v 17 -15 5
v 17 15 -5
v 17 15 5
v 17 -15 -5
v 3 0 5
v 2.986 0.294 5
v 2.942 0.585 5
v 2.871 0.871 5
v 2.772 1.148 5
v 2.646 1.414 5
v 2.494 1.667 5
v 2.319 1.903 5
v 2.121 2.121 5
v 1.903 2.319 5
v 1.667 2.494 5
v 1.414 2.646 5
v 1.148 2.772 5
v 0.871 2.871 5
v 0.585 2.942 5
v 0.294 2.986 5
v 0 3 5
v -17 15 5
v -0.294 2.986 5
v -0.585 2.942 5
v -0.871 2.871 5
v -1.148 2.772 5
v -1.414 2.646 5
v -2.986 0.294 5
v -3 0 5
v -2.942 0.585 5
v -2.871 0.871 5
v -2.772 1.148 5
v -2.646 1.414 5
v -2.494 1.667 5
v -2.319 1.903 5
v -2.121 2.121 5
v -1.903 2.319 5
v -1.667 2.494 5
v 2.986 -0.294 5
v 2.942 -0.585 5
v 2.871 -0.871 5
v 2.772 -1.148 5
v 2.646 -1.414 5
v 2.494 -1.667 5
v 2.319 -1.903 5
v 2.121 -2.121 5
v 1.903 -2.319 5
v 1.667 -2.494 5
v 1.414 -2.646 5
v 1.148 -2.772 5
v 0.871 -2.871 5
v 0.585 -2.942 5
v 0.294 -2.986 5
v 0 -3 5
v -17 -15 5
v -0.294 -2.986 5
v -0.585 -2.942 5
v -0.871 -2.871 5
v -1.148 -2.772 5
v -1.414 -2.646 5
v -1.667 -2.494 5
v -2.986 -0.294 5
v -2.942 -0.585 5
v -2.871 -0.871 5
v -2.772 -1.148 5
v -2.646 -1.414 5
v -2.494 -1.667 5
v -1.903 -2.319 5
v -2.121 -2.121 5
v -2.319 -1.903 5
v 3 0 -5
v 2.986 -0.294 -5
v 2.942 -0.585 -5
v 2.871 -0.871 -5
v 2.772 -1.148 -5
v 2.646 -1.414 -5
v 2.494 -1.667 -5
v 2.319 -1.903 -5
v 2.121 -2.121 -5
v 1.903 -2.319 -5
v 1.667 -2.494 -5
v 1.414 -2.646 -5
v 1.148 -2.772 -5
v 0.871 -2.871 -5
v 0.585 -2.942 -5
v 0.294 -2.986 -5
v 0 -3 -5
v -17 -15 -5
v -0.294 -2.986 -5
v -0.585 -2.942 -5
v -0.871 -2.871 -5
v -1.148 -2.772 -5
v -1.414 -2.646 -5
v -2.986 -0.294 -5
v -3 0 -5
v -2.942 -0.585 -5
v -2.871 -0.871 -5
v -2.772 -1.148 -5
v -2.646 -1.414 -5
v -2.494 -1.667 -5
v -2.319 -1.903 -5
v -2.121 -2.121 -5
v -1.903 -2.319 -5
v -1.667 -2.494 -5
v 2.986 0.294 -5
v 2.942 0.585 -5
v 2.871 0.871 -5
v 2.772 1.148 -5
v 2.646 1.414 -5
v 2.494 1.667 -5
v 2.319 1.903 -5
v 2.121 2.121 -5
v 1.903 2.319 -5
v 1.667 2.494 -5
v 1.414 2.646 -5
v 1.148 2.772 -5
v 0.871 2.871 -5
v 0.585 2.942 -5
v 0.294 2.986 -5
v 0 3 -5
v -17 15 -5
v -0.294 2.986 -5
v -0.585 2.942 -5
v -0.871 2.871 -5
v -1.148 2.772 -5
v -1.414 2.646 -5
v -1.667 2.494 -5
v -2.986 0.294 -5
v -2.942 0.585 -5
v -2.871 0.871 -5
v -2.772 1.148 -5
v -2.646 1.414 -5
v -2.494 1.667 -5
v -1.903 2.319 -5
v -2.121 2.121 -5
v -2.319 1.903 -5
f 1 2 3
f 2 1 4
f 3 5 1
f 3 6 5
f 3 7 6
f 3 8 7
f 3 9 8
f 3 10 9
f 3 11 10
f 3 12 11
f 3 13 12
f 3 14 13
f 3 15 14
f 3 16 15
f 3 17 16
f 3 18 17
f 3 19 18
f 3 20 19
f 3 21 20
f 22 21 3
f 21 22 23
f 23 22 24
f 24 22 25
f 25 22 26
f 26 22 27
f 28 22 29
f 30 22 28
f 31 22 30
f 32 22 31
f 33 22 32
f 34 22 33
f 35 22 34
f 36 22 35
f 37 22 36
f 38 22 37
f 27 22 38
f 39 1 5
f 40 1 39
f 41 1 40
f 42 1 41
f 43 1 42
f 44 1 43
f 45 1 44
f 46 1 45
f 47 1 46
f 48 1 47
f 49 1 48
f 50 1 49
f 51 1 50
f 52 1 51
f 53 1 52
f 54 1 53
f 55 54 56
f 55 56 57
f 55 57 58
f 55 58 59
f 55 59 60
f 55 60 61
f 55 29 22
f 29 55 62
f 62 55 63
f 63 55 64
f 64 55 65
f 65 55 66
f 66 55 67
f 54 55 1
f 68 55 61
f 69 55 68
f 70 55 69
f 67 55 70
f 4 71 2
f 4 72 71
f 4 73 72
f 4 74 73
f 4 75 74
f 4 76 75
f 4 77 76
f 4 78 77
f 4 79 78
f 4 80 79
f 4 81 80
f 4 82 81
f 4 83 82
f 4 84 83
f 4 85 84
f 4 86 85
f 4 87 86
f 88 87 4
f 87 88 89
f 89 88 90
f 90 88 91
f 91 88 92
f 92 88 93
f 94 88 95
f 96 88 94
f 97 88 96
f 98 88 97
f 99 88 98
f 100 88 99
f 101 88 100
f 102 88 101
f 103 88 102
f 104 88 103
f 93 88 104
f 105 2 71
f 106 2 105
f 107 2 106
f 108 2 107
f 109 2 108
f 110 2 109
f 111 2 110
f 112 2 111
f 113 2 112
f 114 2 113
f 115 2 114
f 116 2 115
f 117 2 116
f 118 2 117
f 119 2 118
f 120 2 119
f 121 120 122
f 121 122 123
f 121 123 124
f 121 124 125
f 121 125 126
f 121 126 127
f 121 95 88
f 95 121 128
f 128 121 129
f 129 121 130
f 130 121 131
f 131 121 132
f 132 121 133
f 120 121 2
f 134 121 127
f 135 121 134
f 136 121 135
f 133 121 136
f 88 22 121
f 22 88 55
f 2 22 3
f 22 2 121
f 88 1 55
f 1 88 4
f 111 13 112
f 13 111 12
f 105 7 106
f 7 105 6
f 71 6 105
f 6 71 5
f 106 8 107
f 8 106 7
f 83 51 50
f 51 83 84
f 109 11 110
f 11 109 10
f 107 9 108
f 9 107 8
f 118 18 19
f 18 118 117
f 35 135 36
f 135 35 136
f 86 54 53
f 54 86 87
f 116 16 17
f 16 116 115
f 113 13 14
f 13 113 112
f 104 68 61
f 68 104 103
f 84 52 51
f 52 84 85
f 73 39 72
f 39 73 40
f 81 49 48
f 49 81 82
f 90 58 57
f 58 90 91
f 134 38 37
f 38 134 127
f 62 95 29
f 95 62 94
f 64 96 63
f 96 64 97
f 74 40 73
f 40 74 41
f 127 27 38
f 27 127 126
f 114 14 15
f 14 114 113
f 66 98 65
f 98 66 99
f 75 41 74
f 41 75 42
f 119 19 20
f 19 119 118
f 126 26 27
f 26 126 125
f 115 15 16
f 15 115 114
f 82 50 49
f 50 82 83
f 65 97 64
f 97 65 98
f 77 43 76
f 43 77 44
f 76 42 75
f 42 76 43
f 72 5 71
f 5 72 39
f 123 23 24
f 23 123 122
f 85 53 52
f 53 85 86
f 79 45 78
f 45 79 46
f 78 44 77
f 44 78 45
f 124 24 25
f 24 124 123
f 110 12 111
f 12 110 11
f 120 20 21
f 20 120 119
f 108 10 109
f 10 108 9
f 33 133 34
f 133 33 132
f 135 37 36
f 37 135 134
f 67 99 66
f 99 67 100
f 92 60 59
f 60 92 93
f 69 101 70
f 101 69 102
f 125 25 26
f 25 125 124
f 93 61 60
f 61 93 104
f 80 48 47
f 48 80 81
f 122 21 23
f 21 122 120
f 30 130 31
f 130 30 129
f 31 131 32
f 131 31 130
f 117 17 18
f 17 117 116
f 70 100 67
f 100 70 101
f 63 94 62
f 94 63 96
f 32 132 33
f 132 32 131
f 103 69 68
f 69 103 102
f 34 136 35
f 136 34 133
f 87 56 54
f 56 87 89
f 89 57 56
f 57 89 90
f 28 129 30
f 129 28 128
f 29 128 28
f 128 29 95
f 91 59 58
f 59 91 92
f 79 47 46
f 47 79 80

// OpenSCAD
module linear_bearing_block() {
    difference() {
        // Main block
        cube([34, 30, 10], center = true);
        
        // Shaft hole
        translate([0, 0, -5])
            cylinder(h = 20, d = 6, $fn = 64);
    }
}

linear_bearing_block();
